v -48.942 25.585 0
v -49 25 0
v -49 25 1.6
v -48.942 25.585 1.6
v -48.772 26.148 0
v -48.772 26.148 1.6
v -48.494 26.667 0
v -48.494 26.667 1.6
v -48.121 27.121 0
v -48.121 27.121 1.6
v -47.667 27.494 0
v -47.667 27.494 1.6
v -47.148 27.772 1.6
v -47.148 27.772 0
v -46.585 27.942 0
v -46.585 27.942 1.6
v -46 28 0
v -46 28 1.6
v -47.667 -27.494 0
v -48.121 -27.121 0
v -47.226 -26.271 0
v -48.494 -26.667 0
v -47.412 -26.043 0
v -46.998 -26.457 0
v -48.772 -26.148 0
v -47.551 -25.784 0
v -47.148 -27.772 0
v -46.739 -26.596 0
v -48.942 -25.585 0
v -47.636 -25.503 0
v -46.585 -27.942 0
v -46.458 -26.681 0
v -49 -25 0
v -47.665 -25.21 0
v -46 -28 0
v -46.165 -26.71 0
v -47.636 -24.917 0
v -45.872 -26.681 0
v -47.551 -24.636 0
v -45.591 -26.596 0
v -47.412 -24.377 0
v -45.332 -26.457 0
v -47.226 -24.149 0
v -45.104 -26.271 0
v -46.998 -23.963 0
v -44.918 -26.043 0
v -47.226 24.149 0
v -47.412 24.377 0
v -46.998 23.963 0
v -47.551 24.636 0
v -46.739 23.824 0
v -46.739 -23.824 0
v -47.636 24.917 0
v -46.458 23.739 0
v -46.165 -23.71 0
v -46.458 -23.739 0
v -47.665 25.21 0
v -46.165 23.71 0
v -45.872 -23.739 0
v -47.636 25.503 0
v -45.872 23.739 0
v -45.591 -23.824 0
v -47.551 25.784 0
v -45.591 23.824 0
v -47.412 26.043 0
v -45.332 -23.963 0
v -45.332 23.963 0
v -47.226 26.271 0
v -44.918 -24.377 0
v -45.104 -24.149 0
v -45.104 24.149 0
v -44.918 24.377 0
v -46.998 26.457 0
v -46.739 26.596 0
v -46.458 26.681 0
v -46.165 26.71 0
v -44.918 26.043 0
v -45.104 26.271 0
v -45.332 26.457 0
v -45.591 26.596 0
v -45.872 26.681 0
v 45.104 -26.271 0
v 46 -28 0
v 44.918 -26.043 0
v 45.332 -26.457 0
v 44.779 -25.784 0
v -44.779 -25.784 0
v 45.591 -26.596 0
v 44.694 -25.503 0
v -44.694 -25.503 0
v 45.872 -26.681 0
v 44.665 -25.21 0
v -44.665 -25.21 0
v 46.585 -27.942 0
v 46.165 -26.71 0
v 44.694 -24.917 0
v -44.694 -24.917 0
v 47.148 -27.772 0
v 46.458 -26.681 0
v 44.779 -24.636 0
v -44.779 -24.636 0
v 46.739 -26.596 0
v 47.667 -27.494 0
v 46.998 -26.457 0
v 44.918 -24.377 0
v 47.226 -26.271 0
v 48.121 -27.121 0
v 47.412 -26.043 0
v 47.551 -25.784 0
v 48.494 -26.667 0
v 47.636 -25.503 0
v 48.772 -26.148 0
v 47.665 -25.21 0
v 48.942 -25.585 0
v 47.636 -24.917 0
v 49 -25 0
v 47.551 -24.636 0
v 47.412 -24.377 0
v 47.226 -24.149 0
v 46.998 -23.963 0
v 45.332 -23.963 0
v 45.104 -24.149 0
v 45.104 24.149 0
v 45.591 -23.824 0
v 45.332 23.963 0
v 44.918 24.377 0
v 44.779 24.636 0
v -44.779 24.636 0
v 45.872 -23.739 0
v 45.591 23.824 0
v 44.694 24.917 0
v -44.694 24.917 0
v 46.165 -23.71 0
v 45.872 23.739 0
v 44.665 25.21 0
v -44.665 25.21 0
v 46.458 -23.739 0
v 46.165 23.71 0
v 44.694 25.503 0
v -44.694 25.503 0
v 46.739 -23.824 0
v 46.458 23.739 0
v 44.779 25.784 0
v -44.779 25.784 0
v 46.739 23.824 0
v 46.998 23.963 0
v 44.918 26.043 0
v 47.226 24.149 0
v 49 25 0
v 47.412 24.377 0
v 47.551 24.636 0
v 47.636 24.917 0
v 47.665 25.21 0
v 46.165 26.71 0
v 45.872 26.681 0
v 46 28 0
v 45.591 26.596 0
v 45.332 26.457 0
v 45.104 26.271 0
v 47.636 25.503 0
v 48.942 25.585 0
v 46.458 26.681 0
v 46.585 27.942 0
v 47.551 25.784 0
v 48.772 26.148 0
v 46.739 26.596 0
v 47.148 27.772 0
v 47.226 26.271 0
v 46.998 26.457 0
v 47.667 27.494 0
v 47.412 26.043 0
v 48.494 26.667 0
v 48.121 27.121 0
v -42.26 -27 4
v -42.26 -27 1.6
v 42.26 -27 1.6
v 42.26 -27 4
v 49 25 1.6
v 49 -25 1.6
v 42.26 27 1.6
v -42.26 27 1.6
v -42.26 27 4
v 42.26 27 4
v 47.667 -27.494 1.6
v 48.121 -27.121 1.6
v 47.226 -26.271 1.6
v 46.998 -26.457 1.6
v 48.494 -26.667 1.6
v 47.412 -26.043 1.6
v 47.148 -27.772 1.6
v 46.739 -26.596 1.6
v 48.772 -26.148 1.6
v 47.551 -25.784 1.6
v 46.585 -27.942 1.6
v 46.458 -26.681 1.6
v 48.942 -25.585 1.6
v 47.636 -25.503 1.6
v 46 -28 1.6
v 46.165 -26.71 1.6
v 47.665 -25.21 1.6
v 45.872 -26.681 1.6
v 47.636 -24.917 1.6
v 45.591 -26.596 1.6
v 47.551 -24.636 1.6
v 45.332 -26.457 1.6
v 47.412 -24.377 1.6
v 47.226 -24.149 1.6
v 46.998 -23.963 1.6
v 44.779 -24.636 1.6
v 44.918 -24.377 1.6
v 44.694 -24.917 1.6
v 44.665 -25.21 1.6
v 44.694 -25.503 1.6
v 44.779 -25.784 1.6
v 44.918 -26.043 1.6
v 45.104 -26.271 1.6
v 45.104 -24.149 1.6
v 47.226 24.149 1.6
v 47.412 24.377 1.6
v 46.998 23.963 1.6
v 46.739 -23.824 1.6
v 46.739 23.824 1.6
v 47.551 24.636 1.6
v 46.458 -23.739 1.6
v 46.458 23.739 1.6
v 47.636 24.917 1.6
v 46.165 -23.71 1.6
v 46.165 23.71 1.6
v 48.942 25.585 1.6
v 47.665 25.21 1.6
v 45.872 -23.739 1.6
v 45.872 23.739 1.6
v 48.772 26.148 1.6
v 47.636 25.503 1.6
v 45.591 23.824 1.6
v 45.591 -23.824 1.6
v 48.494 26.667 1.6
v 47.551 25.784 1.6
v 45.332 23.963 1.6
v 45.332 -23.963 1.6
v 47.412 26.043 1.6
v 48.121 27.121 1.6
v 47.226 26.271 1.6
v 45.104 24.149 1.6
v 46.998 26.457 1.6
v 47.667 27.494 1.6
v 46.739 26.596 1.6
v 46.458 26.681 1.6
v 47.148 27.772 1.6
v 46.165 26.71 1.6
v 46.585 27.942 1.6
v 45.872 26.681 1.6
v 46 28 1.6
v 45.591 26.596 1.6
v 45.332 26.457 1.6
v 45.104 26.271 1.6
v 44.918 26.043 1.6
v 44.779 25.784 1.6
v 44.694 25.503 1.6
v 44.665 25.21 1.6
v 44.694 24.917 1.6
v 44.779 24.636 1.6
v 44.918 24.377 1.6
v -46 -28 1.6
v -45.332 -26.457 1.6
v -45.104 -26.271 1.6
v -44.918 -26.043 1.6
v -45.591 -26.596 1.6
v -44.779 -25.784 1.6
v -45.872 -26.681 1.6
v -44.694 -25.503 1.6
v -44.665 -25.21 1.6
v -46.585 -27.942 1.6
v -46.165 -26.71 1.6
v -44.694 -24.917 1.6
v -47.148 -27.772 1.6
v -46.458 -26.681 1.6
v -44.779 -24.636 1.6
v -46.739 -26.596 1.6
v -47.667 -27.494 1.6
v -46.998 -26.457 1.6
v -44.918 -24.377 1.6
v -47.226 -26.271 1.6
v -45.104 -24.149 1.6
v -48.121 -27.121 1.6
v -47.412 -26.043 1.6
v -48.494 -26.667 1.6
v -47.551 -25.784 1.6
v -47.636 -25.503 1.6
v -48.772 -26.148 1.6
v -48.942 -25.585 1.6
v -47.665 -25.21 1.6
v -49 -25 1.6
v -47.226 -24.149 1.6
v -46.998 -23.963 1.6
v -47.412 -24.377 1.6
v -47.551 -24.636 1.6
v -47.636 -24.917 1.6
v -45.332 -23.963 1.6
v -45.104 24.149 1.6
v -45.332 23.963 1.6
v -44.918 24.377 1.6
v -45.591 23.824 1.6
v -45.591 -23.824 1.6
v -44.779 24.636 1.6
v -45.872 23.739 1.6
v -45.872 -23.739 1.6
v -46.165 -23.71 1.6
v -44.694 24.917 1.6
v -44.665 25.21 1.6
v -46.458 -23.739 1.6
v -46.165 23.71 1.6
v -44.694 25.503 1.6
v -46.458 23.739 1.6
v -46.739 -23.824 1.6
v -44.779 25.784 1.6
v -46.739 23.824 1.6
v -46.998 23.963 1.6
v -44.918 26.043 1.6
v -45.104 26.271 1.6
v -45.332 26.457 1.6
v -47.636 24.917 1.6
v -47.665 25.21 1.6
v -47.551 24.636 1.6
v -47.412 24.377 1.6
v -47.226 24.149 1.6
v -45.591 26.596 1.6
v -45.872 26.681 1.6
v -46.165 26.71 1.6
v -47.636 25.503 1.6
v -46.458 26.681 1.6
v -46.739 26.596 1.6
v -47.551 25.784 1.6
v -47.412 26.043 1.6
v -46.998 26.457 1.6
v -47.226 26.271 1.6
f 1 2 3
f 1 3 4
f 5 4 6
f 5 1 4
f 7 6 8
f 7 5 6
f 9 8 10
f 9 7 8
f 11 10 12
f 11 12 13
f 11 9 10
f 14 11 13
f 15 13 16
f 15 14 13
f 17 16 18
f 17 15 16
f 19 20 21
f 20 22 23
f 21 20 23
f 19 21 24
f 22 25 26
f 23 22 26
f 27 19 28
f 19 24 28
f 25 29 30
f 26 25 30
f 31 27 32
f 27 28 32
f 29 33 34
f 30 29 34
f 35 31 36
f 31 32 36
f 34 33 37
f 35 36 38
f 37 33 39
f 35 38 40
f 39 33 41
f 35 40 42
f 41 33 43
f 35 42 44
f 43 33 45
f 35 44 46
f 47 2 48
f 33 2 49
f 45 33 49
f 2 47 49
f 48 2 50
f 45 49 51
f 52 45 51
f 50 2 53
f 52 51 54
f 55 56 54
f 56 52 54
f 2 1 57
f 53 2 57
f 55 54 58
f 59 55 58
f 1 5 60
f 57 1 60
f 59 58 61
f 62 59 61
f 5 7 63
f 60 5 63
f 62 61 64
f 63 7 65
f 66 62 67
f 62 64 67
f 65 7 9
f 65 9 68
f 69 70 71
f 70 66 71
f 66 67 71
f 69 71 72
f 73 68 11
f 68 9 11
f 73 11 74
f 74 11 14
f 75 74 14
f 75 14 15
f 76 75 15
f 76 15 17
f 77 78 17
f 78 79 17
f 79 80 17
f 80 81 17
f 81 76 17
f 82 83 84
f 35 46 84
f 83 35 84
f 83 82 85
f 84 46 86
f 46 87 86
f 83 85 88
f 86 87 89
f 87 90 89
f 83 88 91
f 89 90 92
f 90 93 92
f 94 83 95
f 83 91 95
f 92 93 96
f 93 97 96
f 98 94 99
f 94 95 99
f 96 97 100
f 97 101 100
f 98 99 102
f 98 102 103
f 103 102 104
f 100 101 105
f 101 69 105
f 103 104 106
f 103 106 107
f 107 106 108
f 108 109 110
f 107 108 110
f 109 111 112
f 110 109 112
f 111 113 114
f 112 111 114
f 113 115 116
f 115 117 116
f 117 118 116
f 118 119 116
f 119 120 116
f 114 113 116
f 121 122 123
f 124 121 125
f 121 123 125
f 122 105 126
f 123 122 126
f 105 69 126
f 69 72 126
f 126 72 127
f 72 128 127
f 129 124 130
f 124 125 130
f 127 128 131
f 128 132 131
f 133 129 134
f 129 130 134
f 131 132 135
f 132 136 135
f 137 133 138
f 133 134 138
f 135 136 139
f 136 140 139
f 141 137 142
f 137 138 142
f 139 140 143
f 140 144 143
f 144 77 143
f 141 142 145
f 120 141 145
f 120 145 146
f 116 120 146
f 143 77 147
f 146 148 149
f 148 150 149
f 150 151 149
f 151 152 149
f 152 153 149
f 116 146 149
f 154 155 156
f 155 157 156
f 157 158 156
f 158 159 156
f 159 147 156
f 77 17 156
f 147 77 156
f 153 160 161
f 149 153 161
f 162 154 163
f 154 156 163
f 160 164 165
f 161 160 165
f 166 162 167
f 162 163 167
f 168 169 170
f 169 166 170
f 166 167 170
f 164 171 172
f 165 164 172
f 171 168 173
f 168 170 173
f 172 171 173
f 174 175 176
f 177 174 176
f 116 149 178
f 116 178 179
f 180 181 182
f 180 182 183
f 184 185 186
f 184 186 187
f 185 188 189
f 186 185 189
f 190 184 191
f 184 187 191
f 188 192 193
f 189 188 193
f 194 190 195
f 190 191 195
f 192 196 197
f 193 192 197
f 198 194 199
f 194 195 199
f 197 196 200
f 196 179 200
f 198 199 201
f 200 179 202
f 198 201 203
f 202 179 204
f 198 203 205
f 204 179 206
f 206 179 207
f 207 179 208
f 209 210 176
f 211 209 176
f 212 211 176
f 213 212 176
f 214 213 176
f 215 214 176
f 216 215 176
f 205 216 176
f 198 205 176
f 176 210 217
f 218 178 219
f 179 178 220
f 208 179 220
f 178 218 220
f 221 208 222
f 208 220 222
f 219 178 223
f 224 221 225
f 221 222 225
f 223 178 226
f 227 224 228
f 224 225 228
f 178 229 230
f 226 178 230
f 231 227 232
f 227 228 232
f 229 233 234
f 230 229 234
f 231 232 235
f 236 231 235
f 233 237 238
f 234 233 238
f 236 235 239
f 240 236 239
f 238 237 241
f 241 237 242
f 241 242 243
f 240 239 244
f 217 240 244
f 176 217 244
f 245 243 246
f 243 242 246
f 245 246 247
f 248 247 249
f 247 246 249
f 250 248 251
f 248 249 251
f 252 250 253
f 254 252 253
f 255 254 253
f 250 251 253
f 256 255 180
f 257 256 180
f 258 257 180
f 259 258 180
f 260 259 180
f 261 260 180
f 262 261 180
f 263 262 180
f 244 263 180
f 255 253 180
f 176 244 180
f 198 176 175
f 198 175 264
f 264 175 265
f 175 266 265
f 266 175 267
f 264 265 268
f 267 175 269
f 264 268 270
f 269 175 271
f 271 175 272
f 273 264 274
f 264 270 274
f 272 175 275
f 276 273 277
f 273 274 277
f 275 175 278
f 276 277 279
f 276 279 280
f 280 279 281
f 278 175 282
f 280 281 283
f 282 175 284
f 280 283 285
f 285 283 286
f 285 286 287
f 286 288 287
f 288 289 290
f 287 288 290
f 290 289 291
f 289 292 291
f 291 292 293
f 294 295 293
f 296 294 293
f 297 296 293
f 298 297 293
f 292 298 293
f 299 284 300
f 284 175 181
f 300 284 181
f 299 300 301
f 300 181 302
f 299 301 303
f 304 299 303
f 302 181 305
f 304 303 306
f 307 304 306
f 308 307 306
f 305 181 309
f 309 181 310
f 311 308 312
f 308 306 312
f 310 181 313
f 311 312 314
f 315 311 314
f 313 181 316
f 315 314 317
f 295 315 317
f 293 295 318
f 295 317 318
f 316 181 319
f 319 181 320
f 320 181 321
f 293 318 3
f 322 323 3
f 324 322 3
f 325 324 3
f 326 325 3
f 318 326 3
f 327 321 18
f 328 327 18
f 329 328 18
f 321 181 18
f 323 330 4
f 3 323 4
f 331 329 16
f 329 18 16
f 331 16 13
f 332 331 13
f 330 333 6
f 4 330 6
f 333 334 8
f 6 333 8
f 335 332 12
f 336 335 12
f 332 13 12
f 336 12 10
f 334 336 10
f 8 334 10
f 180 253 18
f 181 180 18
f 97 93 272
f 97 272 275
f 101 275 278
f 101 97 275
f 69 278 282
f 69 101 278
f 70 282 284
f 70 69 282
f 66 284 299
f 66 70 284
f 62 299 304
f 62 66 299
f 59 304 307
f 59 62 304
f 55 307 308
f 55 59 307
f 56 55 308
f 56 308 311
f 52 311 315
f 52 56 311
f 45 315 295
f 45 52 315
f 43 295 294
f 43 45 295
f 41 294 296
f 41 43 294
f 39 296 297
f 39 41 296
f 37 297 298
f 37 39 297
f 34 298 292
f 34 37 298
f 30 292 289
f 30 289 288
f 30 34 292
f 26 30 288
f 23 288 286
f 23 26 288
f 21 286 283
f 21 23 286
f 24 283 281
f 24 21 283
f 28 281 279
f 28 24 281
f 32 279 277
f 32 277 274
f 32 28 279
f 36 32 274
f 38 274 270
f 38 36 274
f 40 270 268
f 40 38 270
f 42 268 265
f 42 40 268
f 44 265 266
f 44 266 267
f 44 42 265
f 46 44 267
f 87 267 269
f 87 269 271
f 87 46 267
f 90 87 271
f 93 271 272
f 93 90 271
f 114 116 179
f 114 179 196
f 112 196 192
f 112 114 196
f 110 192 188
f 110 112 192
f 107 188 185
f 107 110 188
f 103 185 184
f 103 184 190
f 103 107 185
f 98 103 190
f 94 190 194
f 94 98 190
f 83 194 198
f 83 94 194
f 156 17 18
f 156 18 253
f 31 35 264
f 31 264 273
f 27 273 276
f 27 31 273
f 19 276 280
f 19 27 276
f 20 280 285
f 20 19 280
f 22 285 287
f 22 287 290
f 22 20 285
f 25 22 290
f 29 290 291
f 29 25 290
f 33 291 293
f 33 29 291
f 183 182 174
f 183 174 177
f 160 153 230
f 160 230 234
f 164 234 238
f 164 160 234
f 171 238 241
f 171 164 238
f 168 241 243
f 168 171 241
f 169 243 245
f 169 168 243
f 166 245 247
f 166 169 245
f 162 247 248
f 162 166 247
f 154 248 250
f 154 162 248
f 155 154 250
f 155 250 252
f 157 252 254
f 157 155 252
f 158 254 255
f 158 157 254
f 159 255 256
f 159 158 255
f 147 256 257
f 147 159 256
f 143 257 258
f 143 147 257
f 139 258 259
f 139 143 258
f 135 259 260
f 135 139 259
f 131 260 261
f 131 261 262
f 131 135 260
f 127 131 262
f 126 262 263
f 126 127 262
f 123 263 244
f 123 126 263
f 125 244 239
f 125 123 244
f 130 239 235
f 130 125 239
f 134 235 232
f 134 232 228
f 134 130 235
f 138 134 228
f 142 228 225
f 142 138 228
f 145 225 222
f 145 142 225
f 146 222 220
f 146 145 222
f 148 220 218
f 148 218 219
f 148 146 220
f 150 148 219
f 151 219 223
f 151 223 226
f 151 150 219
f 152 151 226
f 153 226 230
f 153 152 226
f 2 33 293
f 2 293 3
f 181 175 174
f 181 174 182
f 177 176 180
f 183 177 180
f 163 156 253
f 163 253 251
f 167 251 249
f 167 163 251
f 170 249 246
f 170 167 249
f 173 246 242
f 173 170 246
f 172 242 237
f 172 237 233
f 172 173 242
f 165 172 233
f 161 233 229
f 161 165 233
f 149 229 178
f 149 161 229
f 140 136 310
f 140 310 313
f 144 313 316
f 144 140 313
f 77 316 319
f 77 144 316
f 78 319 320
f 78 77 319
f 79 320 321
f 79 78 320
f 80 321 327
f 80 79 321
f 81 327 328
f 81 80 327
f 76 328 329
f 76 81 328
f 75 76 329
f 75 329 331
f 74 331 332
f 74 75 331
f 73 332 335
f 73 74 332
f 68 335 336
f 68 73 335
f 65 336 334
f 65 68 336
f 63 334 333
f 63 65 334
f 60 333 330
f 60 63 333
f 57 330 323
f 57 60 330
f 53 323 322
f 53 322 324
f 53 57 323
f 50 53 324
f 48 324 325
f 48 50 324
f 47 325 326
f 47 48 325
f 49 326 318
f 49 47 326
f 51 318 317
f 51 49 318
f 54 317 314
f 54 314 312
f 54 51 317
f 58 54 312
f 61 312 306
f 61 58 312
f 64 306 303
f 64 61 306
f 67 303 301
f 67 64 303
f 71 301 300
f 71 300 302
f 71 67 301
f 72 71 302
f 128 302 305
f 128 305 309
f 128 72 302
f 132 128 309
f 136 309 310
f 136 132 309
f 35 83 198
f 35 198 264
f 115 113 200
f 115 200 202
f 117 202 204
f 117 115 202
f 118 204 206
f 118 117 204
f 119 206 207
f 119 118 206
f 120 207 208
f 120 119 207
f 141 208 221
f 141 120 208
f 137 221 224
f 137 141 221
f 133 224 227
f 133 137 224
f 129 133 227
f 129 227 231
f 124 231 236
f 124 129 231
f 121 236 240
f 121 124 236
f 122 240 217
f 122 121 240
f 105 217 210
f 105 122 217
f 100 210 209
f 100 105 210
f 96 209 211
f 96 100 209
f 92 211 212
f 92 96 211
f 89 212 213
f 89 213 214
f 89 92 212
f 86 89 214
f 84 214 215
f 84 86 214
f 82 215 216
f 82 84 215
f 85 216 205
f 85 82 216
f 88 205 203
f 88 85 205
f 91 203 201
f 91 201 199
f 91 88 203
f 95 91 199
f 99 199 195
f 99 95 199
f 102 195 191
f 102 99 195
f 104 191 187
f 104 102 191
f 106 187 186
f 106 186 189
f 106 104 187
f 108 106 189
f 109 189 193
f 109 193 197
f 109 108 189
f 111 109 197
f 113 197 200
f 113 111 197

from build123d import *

# Parameters (mm, degrees)
ESBO_O1_R                = 1.5
RESSALTO_EXTRUS_O1_DEPTH = 1.6
ESBO_O1_3_W              = 84.52
ESBO_O1_3_H              = 54
RESSALTO_EXTRUS_O2_DEPTH = 4


with BuildPart() as part:
    # Esboço1 → Ressalto-extrusão1 (new body)
    with BuildSketch(Plane.XY):
        with BuildLine():
            Line((46, 28), (-46, 28))
            ThreePointArc((-46, 28), (-48.121320344, 27.121320344), (-49, 25))
            Line((-49, 25), (-49, -25))
            ThreePointArc((-49, -25), (-48.121320344, -27.121320344), (-46, -28))
            Line((-46, -28), (46, -28))
            ThreePointArc((46, -28), (48.121320344, -27.121320344), (49, -25))
            Line((49, -25), (49, 25))
            ThreePointArc((49, 25), (48.121320344, 27.121320344), (46, 28))
        make_face()
        with Locations((-46.165, -25.21)):
            Circle(ESBO_O1_R, mode=Mode.SUBTRACT)
        with Locations((46.165, -25.21)):
            Circle(ESBO_O1_R, mode=Mode.SUBTRACT)
        with Locations((-46.165, 25.21)):
            Circle(ESBO_O1_R, mode=Mode.SUBTRACT)
        with Locations((46.165, 25.21)):
            Circle(ESBO_O1_R, mode=Mode.SUBTRACT)
    extrude(amount=RESSALTO_EXTRUS_O1_DEPTH)

    # Esboço1<3> → Ressalto-extrusão2 (add)
    with BuildSketch(Plane.XY):
        Rectangle(ESBO_O1_3_W, ESBO_O1_3_H)
    extrude(amount=RESSALTO_EXTRUS_O2_DEPTH)


solid = part.part
